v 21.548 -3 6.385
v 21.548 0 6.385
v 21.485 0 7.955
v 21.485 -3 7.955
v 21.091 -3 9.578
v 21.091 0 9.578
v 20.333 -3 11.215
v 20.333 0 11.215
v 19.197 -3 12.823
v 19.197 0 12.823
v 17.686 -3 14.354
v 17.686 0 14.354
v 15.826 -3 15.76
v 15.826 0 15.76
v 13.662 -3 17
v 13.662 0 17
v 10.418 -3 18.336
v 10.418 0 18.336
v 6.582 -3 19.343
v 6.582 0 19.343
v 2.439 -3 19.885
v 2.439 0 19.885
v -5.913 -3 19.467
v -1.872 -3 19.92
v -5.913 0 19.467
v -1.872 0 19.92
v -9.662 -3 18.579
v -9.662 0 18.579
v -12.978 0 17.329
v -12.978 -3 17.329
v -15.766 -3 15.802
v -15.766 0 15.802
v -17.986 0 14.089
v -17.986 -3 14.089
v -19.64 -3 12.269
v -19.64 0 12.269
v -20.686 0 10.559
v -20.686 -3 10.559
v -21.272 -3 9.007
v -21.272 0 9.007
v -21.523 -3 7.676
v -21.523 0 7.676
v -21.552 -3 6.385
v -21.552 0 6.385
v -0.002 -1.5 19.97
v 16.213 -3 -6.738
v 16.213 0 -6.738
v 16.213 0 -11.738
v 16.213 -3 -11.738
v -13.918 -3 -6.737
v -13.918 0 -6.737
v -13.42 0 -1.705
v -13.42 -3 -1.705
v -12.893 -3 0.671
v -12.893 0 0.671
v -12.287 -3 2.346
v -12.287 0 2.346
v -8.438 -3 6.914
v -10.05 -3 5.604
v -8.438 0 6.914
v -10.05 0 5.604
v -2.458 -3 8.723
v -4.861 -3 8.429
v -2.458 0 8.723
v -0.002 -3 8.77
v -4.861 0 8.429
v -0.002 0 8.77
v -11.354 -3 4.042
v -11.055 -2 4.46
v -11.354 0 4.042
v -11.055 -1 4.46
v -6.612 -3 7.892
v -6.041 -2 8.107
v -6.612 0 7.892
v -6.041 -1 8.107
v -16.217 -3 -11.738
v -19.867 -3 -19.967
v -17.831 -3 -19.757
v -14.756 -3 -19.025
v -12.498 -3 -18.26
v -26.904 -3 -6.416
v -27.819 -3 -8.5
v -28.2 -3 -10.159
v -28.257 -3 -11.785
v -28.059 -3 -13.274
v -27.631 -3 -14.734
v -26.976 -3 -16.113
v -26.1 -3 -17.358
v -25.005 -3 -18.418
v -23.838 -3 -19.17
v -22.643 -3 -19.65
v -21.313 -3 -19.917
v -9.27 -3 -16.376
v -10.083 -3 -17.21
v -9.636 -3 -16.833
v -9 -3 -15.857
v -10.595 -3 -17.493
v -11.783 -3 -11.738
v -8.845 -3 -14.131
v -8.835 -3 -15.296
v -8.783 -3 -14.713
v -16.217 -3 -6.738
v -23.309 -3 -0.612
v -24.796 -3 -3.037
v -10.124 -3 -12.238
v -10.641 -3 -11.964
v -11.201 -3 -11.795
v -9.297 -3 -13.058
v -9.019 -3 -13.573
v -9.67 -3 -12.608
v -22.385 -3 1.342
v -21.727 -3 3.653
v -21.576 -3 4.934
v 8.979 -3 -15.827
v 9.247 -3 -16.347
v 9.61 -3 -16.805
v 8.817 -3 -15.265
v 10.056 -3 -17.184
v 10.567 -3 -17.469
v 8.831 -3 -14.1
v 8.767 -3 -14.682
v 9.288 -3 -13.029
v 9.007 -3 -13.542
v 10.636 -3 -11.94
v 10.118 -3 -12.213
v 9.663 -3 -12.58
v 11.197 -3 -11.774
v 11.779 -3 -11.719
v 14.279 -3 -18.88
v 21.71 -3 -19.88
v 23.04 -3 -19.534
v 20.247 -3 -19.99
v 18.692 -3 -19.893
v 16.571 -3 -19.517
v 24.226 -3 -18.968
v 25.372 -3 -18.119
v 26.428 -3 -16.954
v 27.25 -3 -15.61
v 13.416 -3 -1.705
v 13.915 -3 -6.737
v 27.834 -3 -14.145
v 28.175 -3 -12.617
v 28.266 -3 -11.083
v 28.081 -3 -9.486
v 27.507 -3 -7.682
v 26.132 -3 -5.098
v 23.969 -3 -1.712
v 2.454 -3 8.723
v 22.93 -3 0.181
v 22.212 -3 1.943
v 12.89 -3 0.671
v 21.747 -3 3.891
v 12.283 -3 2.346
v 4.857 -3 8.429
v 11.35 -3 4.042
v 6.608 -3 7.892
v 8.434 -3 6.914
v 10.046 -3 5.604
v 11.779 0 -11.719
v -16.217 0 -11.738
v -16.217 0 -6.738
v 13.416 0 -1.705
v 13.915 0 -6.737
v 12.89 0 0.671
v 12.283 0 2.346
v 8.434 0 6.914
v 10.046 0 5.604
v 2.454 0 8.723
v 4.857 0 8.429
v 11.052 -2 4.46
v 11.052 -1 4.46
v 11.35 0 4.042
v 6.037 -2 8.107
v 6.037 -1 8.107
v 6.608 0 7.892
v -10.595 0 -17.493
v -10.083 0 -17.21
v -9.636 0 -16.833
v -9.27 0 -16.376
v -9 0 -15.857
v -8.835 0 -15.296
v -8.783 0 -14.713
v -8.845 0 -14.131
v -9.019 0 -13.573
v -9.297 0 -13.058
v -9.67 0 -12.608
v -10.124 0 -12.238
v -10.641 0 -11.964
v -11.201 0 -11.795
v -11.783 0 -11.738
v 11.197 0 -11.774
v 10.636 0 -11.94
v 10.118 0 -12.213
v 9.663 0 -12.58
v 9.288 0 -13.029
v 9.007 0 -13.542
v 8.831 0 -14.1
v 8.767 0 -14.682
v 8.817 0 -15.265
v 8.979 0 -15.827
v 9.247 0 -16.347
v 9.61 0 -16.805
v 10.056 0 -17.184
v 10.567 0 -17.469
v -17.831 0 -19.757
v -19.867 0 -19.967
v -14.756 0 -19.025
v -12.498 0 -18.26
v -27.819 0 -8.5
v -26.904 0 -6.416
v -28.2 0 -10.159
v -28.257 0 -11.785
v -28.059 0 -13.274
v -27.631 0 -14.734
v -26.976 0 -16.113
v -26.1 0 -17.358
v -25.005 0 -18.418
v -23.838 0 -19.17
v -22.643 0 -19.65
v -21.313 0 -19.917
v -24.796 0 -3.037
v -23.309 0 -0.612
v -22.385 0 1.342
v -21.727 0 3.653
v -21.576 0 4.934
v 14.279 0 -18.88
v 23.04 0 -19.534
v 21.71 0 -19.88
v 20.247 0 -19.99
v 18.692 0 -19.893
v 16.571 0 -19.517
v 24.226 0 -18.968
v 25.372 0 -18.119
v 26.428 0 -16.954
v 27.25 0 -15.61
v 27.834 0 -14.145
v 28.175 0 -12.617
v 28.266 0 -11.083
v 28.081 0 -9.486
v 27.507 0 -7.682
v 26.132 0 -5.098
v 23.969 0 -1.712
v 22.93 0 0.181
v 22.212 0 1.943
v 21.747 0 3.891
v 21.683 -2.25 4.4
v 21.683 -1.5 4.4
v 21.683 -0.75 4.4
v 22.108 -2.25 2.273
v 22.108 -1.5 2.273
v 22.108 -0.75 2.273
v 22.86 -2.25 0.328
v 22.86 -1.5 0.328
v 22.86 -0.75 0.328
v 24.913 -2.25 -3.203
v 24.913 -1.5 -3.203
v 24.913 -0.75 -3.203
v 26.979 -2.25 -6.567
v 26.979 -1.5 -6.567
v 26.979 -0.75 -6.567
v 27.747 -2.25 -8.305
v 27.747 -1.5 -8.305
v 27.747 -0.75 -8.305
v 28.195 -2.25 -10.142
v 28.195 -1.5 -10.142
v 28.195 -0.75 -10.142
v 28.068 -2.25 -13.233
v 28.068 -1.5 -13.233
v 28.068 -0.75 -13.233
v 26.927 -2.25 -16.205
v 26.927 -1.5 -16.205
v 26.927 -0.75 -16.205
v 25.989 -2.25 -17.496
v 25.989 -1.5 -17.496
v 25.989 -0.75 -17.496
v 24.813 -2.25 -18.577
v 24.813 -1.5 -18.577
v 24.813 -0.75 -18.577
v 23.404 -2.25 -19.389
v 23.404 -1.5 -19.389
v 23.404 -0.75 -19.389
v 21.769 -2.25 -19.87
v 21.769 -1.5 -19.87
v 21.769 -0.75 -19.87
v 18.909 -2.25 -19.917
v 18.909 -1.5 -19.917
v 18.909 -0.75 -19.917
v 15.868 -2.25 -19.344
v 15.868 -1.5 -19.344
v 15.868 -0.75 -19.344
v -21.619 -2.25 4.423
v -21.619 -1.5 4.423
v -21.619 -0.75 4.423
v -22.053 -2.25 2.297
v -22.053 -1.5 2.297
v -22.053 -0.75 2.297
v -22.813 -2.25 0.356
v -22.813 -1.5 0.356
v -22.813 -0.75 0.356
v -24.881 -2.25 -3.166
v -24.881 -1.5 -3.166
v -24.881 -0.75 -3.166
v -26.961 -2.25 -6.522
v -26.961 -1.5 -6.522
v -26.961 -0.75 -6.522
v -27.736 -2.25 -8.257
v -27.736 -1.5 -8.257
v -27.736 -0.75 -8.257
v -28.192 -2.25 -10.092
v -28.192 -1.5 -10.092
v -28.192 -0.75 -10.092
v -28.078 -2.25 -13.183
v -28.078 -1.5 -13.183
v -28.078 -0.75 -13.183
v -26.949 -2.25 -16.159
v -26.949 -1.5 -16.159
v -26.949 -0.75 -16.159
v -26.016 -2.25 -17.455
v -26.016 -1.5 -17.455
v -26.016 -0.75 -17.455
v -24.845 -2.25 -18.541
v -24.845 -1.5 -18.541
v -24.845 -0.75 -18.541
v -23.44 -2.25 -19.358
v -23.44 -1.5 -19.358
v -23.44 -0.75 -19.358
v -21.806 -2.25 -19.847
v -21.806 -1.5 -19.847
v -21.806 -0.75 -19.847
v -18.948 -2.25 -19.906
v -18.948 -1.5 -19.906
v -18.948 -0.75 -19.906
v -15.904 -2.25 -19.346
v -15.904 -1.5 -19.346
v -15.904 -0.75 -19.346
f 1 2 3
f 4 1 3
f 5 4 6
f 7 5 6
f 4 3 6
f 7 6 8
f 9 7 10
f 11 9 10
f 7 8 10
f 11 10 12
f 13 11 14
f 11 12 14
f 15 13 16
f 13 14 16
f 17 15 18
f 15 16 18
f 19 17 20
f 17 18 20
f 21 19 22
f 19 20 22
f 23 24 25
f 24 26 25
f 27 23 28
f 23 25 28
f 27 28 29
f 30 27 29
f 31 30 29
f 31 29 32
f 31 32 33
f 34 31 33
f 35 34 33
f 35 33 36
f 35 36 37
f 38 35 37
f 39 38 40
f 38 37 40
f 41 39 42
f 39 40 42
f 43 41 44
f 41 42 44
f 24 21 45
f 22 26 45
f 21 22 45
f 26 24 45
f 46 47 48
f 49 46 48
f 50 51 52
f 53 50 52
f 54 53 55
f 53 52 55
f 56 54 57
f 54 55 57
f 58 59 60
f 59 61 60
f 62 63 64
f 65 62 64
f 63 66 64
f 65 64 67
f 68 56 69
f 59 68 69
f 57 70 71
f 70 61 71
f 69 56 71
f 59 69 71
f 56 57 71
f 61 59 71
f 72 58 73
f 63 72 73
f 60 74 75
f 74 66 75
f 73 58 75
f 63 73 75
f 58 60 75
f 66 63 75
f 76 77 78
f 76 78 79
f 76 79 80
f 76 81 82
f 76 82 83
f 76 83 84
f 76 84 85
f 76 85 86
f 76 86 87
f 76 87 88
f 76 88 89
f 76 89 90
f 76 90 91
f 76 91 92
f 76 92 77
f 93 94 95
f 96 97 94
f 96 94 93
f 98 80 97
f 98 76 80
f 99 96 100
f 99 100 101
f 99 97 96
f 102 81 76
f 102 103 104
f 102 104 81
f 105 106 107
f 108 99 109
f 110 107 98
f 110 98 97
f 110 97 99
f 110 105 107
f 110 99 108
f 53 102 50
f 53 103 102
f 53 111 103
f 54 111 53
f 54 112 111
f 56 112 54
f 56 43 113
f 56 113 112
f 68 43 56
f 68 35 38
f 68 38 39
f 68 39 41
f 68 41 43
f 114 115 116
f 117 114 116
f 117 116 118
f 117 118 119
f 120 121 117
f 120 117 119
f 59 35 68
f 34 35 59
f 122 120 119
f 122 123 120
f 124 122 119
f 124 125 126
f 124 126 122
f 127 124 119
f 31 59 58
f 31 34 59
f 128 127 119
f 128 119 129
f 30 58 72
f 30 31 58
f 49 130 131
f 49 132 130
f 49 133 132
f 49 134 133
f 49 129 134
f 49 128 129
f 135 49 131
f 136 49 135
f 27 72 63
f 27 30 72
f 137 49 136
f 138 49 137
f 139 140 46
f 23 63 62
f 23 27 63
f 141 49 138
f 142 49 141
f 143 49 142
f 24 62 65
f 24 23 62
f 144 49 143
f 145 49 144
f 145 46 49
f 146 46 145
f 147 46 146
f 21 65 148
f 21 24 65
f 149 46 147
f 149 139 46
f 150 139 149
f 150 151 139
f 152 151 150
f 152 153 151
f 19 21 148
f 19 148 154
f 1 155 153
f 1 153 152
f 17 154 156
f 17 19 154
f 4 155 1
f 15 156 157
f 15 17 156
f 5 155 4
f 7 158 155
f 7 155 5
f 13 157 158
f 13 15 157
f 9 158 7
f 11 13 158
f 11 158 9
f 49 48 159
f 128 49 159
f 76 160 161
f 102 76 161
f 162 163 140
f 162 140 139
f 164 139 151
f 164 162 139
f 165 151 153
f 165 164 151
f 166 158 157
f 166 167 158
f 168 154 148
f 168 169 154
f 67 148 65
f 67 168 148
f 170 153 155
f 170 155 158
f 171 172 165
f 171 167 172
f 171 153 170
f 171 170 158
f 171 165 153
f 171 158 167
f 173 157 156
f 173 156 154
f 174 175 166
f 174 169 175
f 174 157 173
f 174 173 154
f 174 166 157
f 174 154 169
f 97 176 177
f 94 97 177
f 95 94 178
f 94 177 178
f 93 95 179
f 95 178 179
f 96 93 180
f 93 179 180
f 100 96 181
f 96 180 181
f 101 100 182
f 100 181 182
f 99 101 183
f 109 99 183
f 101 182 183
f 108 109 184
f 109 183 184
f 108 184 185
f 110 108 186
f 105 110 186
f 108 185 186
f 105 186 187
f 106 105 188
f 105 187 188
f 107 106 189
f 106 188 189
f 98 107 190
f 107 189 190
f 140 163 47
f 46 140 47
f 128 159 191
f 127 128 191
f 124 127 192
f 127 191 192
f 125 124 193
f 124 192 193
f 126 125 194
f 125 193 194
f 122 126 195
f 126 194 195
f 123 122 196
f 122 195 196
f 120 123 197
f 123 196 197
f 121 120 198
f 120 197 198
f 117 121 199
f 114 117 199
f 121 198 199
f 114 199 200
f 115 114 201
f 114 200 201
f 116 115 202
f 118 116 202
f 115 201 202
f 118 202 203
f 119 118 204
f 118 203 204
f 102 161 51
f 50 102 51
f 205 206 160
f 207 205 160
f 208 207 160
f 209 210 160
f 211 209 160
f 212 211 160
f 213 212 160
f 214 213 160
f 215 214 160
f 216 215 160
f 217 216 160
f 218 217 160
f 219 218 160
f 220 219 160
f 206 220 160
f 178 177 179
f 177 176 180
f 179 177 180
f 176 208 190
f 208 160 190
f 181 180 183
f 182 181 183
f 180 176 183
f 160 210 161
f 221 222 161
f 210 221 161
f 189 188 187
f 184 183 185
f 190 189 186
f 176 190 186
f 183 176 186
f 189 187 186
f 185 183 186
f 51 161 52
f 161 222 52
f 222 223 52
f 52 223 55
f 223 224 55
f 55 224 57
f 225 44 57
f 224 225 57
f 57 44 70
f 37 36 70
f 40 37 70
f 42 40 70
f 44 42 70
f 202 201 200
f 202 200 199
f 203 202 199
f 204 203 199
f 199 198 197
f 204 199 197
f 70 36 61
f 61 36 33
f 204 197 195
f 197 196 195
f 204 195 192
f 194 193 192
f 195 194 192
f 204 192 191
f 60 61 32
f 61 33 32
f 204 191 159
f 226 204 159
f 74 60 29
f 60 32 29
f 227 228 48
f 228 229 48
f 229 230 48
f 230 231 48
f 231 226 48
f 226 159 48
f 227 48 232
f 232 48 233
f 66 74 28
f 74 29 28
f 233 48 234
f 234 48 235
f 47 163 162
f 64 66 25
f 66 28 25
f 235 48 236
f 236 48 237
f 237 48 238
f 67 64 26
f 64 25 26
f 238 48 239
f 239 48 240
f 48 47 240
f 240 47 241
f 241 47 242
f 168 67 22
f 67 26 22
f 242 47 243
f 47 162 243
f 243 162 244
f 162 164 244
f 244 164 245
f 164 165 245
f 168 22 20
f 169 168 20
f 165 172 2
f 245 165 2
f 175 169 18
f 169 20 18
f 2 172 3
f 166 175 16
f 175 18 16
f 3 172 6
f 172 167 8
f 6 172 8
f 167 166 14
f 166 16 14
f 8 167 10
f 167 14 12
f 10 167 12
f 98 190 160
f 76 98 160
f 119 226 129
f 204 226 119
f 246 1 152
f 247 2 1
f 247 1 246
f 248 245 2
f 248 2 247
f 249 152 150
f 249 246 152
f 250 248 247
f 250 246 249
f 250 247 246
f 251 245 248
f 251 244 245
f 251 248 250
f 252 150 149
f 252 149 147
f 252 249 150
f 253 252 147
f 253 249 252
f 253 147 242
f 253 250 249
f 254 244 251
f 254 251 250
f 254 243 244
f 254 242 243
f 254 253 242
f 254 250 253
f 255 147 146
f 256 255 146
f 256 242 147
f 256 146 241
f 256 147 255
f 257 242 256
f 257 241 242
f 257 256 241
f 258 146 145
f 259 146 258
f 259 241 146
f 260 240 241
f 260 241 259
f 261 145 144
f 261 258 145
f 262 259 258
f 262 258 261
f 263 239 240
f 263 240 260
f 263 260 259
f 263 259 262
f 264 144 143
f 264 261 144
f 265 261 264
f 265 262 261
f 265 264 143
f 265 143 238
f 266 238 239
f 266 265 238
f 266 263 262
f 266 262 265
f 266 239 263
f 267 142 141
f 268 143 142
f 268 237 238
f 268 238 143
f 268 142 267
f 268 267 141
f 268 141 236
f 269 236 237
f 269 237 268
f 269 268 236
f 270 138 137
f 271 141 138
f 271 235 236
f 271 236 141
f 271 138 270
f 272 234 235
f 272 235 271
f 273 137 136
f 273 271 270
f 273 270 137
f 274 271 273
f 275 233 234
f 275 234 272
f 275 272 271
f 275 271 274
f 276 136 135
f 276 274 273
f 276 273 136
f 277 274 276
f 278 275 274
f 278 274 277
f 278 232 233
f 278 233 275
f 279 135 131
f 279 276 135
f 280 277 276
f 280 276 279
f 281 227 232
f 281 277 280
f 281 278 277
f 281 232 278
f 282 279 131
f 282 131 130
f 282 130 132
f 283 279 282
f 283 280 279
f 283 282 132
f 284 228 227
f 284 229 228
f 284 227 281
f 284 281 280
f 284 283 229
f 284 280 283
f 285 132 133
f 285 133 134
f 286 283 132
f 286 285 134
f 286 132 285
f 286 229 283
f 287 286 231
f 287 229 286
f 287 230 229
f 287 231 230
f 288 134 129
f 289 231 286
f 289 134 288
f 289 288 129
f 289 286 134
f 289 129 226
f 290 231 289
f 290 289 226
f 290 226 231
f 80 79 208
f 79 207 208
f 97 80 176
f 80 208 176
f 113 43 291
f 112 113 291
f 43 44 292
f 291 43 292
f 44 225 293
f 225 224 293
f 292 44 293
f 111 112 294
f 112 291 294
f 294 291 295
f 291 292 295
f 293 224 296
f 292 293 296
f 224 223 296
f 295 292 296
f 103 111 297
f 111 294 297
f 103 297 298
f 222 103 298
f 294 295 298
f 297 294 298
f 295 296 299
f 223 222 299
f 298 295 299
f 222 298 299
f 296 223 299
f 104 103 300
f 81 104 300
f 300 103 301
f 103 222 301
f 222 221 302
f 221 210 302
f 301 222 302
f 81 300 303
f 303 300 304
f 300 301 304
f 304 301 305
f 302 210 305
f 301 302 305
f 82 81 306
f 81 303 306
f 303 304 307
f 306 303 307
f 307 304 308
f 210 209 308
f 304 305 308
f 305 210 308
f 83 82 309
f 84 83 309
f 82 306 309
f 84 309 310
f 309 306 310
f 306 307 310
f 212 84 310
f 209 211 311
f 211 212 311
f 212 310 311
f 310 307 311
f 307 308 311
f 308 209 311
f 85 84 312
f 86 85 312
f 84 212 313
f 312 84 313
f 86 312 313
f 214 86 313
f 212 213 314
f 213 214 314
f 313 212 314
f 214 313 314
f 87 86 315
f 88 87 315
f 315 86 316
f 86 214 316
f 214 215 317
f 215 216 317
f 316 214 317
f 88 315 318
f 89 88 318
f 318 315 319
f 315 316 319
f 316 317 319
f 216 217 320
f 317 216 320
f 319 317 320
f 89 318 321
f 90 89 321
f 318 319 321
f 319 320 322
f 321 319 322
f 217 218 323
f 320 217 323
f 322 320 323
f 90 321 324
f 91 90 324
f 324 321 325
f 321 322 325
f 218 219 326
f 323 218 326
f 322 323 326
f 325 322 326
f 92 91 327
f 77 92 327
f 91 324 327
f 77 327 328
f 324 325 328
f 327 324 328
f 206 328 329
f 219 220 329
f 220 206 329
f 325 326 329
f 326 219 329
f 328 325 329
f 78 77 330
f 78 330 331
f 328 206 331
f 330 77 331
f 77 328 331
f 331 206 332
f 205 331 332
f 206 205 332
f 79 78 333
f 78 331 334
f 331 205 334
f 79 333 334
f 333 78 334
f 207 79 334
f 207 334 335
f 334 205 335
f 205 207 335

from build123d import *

# Parameters (mm, degrees)
F1_DEPTH = 3


# Not quite as in the source:
# - ends of sketch curves that miss each other by under 0.0002 mm in the source are joined
# - the dataset's text gives a spline's control points without its knots; the knots are read off the source's solid


with BuildPart() as f1:
    # F0 (on Front) → F1 (new body)
    with BuildSketch(Plane.XZ):
        with BuildLine():
            Line((-11.783002, -11.737941), (-16.216865, -11.737941))
            Line((-16.216865, -11.737941), (-16.216865, -6.737941))
            Line((-16.216865, -6.737941), (-13.918449, -6.737102))
            add(Edge.make_bspline(
                [(-13.918449, -6.737102), (-13.638513, -2.664171), (-13.2084, 3.593756), (-6.220813, 8.755675), (-2.060783, 8.765088), (-0.001865, 8.769746)],
                knots=[0, 0, 0, 0, 11.557339, 17.757478, 23.833112, 23.833112, 23.833112, 23.833112], degree=3))
            add(Edge.make_bspline(
                [(13.914719, -6.737102), (13.634783, -2.664171), (13.204671, 3.593756), (6.217084, 8.755675), (2.057054, 8.765088), (-0.001865, 8.769746)],
                knots=[0, 0, 0, 0, 11.557339, 17.757478, 23.833112, 23.833112, 23.833112, 23.833112], degree=3))
            Line((13.914719, -6.737102), (16.213135, -6.737941))
            Line((16.213135, -6.737941), (16.213135, -11.737941))
            Line((16.213135, -11.737941), (11.779312, -11.719301))
            ThreePointArc((11.779312, -11.719301), (8.8312342753, -14.1003719552), (10.5670700482, -17.4689818896))
            add(Edge.make_bspline(
                [(21.548331, 6.385136), (21.605514, 5.997937), (21.59991, -1.100257), (31.640163, -7.824719), (24.68515, -22.844764), (13.312431, -18.666716), (10.5670700482, -17.4689818896)],
                knots=[26.688985, 26.688985, 26.688985, 26.688985, 28.557776, 42.872008, 54.1154, 62.665306, 62.665306, 62.665306, 62.665306], degree=3))
            add(Edge.make_bspline(
                [(21.548331, 6.385136), (22.3407527768, 19.9695551789), (-0.001862111, 19.969557), (-22.3444769988, 19.9695588211), (-21.5520604233, 6.3851402115)],
                knots=[6.247711, 6.247711, 6.247711, 7.8539815, 7.8539815, 9.460252, 9.460252, 9.460252], degree=2, weights=[1, 0.6944541981, 1, 0.6944541981, 1]))
            add(Edge.make_bspline(
                [(-21.5520604233, 6.3851402115), (-21.534633, 6.02045), (-21.558871, -1.077705), (-31.627305, -7.759898), (-24.735498, -22.809049), (-13.345315, -18.678849), (-10.594943, -17.492667)],
                knots=[26.688985, 26.688985, 26.688985, 26.688985, 28.557776, 42.872008, 54.1154, 62.665306, 62.665306, 62.665306, 62.665306], degree=3))
            ThreePointArc((-10.594943, -17.492667), (-8.8449602866, -14.1313844153), (-11.783002, -11.737941))
        make_face()
    extrude(amount=F1_DEPTH)


solid = f1.part
